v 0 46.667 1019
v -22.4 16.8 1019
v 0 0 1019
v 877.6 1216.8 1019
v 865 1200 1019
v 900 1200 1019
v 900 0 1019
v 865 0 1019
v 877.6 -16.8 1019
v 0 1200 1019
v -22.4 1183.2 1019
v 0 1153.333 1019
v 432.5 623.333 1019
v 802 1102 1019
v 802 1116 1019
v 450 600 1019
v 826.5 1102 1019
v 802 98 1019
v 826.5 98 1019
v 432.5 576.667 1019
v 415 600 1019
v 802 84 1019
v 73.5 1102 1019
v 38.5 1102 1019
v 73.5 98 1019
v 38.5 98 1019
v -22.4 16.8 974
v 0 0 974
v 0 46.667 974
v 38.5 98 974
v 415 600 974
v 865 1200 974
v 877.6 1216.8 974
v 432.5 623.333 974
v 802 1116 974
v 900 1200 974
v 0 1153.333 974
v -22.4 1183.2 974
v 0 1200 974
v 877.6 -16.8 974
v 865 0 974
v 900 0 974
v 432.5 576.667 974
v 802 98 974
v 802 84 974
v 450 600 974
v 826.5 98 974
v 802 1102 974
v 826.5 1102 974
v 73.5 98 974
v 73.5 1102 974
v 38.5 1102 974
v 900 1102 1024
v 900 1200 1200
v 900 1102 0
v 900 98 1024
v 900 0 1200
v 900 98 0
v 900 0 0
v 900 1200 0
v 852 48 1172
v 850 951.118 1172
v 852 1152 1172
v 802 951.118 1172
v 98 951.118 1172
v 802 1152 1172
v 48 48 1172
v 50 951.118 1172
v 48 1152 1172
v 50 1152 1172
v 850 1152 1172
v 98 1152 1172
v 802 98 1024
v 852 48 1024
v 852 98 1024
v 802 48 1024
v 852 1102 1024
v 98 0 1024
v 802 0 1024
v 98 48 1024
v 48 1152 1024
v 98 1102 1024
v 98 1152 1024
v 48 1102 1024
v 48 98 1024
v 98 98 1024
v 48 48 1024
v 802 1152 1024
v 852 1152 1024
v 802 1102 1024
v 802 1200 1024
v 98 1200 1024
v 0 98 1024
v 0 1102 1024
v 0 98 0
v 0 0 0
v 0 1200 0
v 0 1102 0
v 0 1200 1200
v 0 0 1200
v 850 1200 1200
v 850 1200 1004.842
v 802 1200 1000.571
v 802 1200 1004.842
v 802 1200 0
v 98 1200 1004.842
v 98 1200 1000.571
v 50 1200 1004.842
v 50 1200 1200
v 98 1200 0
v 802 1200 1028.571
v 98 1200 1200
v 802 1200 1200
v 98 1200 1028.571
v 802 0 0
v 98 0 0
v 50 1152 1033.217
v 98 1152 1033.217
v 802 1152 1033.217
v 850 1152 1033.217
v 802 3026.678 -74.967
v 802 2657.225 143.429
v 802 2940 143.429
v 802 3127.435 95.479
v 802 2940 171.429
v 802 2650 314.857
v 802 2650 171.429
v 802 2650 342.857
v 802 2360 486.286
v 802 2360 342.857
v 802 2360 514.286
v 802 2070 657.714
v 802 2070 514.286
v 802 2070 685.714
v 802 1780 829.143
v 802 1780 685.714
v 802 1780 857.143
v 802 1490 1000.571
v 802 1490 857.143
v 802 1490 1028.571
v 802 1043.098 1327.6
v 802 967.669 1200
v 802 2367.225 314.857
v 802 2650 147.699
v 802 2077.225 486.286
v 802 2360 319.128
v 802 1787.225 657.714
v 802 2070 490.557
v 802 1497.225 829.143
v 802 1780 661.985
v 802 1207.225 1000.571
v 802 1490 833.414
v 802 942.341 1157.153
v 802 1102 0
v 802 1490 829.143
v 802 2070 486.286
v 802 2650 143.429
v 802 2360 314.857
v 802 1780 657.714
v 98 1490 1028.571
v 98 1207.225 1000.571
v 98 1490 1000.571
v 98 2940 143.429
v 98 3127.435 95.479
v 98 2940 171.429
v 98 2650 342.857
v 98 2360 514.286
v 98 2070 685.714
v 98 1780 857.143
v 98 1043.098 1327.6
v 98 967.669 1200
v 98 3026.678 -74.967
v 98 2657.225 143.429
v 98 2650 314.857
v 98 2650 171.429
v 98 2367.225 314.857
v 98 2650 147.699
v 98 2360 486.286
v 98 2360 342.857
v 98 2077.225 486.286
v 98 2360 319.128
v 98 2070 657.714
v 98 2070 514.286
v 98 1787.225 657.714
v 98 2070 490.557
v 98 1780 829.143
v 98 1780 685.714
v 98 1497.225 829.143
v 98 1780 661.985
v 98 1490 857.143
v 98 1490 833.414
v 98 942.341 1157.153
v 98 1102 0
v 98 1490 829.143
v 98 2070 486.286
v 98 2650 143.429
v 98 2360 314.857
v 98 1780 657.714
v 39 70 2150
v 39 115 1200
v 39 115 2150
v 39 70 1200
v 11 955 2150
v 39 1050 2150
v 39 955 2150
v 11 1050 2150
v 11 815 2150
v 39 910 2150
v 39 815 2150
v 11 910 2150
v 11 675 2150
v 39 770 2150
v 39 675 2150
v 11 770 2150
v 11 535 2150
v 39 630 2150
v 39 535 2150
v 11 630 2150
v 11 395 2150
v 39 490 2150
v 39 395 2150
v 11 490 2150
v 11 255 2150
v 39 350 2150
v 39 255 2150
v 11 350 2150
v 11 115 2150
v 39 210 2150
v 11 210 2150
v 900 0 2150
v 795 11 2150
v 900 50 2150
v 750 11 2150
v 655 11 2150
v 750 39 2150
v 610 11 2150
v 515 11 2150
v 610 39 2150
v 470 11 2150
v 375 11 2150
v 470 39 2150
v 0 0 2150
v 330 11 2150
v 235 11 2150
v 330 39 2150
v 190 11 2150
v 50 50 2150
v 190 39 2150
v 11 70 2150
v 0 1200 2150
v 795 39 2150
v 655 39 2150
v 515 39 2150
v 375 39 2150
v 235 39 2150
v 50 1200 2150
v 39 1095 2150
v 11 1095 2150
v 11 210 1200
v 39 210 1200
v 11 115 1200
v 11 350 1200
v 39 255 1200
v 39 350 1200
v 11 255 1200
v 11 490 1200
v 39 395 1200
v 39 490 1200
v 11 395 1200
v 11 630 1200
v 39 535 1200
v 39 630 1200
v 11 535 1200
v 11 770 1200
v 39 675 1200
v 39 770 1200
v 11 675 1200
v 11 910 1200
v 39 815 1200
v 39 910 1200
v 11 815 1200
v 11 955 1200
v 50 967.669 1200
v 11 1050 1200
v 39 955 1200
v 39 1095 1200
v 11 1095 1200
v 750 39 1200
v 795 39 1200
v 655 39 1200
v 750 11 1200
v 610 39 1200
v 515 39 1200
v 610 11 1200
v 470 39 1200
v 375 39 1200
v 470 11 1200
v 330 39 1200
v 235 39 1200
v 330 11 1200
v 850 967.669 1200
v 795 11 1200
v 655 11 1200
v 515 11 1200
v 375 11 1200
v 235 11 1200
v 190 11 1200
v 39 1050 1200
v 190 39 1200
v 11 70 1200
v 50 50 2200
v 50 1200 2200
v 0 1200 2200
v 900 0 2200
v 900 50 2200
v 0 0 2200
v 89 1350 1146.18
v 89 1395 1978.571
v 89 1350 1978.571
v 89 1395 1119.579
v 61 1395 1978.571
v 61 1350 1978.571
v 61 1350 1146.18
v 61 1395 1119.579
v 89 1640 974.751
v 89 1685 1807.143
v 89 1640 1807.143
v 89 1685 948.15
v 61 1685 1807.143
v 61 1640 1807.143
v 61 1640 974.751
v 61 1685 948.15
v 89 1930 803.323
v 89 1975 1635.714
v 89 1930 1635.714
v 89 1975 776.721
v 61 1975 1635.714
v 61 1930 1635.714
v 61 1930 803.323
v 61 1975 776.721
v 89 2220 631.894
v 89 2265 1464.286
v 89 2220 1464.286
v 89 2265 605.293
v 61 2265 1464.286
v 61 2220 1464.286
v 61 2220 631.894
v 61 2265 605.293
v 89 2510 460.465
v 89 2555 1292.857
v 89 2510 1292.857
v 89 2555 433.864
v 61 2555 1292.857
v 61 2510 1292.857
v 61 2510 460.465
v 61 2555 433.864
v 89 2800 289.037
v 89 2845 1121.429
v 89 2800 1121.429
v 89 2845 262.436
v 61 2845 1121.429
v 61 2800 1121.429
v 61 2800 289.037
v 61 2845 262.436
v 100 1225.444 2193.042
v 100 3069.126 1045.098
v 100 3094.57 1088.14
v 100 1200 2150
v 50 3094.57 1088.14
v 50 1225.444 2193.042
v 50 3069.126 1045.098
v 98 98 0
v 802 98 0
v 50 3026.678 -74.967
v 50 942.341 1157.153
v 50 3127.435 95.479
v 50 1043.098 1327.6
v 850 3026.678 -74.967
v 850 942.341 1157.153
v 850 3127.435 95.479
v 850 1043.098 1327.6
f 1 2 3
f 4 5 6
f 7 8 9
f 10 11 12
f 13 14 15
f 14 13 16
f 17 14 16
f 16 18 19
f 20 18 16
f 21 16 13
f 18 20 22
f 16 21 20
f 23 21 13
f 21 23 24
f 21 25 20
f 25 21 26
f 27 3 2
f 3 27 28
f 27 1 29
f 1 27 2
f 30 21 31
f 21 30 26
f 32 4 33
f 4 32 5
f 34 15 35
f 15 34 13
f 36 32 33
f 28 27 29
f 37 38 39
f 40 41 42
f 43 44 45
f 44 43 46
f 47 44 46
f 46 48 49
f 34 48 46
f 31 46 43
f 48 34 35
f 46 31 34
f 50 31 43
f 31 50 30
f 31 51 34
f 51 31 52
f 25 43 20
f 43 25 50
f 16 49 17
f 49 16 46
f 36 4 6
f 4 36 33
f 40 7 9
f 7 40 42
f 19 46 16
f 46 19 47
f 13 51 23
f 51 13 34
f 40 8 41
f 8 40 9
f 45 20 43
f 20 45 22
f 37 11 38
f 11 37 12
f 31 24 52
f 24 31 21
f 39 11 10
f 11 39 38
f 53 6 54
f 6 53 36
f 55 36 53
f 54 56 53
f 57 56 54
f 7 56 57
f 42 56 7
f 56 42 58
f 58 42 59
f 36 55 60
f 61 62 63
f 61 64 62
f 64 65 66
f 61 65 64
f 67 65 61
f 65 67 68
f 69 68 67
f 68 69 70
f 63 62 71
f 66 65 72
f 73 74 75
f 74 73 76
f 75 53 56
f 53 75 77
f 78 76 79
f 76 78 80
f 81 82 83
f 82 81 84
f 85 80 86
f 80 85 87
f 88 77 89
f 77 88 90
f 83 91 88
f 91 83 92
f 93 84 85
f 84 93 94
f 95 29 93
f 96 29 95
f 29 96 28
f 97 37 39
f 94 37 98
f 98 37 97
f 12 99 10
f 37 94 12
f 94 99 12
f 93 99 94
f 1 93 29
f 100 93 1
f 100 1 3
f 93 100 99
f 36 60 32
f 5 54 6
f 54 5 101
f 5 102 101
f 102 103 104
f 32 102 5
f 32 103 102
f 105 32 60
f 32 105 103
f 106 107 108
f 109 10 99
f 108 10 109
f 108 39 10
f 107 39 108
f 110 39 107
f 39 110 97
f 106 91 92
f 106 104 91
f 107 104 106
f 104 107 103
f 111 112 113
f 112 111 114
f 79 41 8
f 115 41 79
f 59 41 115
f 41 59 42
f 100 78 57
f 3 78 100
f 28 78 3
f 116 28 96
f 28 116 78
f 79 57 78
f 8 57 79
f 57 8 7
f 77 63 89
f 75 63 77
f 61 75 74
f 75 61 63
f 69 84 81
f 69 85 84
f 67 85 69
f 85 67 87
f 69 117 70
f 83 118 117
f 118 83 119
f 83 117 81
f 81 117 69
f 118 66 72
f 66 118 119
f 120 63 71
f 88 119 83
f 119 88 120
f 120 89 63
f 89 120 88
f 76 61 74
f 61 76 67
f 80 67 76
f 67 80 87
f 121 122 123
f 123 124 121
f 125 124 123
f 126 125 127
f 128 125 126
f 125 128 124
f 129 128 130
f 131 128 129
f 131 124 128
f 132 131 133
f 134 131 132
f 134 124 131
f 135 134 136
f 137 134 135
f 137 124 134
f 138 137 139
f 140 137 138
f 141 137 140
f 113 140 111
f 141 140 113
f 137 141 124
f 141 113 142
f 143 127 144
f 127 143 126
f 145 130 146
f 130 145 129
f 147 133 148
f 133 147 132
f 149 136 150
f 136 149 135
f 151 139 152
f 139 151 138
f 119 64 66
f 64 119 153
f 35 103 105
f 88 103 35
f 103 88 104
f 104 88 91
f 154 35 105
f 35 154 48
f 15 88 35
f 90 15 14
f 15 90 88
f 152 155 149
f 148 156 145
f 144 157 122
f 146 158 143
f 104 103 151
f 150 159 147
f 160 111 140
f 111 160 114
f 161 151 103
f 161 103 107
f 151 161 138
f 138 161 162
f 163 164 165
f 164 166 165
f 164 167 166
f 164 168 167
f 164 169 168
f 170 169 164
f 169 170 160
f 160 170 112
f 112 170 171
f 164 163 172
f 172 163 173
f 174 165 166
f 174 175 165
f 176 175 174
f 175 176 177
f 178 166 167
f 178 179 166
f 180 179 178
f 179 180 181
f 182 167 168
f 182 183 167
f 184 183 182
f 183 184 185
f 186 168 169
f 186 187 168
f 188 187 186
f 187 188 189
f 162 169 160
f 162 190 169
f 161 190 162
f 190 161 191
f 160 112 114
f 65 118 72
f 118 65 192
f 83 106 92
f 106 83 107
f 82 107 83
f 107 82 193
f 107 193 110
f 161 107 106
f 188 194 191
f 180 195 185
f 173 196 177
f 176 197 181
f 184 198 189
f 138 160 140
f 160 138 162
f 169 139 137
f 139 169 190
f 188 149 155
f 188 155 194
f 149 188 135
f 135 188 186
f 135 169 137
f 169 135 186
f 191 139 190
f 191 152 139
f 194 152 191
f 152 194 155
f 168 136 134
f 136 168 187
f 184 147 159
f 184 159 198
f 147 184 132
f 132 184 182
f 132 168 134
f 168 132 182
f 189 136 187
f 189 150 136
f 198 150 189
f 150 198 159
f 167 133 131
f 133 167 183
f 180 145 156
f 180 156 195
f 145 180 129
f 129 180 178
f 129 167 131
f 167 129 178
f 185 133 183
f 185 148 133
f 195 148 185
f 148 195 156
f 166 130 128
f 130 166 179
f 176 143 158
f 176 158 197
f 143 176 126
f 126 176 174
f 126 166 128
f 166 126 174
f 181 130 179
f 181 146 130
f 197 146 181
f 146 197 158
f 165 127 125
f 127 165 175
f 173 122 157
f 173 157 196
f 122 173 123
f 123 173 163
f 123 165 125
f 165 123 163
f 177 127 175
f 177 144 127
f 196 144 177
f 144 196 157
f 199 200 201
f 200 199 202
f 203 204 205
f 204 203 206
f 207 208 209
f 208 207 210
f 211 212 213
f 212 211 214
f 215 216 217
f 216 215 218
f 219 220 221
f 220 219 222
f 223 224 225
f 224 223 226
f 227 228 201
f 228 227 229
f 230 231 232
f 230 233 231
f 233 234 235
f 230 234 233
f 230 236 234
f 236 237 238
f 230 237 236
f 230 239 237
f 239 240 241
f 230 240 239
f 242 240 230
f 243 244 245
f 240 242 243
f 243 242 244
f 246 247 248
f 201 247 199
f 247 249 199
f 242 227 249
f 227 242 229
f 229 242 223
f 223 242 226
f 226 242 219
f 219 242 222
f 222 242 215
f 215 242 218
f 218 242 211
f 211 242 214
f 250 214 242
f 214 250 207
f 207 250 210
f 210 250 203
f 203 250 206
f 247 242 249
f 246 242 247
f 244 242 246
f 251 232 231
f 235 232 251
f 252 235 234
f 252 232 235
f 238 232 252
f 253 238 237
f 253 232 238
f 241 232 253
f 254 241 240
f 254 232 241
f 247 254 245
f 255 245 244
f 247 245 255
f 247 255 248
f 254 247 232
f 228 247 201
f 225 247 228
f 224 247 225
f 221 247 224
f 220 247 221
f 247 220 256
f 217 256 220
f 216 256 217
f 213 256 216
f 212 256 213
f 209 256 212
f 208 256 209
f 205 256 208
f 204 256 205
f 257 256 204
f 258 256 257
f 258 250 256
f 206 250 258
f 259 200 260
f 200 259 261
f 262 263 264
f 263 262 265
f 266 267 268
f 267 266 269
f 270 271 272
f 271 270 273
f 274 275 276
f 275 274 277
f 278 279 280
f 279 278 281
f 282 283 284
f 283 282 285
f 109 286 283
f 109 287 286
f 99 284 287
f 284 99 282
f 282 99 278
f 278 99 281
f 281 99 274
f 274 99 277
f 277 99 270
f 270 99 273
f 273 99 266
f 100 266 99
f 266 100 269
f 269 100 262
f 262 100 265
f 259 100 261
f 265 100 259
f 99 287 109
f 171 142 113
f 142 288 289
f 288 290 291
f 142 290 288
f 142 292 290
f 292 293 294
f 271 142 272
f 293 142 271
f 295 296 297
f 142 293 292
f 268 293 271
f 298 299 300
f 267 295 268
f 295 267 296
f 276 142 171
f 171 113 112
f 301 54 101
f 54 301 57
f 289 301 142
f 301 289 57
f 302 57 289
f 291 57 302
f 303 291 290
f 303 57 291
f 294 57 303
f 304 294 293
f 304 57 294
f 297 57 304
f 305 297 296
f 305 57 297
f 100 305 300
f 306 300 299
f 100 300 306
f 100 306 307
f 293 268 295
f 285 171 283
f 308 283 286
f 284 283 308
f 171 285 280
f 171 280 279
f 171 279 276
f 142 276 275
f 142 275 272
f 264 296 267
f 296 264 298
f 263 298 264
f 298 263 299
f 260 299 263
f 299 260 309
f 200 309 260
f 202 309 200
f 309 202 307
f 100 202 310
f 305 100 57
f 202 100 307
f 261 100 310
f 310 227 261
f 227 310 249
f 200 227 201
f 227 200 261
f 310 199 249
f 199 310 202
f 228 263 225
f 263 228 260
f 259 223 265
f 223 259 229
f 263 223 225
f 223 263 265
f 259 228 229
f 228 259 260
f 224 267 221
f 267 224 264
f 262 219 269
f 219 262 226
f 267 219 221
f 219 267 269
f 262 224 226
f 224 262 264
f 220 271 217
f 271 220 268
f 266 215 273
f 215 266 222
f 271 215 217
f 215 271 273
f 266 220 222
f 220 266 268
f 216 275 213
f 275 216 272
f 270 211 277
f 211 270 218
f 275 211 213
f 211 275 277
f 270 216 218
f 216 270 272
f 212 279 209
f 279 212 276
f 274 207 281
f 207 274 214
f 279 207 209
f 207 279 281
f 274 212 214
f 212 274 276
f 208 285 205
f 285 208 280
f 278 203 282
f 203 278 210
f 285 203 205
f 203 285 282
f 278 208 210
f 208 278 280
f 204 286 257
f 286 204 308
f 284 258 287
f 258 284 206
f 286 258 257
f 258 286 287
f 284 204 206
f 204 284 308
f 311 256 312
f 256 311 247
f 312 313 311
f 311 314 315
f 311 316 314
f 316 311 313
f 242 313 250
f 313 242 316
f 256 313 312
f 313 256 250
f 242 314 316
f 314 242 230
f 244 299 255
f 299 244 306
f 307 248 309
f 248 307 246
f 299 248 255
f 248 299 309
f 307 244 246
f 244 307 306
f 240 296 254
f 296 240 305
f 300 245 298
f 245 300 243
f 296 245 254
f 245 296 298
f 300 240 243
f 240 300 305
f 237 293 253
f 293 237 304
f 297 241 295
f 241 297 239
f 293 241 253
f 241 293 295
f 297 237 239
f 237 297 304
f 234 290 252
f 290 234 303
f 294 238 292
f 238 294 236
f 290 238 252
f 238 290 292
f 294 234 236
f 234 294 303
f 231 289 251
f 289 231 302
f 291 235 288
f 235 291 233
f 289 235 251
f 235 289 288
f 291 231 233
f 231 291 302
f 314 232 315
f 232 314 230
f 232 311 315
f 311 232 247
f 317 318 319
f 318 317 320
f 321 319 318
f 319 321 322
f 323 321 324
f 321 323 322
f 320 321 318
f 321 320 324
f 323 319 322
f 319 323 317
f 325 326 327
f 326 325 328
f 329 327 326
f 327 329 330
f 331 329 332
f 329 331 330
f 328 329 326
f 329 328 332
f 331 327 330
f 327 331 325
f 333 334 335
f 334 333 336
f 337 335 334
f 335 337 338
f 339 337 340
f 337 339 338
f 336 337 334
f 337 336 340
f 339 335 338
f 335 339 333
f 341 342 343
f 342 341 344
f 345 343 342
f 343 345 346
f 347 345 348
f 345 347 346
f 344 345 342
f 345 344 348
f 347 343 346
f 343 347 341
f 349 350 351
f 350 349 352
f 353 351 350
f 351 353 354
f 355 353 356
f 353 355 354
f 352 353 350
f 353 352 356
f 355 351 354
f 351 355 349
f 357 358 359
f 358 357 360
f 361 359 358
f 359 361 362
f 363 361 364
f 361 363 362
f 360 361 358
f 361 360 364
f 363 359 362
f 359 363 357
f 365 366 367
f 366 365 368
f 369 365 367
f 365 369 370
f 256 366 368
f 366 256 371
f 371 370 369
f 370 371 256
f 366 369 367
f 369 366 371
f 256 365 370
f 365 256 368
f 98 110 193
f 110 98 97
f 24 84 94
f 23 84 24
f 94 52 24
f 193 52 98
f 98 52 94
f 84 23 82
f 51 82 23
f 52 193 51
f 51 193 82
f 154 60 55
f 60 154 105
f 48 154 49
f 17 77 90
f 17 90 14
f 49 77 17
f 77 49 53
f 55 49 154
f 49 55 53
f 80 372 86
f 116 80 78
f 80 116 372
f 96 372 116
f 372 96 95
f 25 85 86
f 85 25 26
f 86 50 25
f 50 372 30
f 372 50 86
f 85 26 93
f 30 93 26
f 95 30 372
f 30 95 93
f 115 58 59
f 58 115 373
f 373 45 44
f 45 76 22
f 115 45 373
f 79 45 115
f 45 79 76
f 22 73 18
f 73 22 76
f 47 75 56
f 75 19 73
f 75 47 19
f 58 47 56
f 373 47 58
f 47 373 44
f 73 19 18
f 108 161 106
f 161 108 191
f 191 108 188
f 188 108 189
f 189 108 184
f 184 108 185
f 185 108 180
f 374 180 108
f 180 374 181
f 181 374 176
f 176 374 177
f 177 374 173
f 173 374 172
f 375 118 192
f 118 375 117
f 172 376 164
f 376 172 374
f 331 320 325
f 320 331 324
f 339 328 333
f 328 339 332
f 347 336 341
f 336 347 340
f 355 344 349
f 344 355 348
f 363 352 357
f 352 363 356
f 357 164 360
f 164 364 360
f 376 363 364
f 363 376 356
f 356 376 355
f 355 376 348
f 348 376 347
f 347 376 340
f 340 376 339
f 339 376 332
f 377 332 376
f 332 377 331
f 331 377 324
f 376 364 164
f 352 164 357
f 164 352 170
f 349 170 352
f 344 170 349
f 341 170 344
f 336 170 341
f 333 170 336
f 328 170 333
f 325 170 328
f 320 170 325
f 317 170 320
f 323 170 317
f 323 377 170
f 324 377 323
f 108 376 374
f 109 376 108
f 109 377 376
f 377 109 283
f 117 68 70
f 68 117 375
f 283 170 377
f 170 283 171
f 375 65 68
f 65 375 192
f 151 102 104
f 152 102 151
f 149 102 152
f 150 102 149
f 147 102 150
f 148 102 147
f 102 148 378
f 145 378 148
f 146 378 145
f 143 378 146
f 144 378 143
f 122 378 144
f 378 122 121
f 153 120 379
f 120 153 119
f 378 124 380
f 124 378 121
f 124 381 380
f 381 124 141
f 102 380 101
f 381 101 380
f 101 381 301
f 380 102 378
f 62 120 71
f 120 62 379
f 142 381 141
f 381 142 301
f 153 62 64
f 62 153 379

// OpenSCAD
// --- PARAMETRIT ---
eps = 0.05; 

tasanne_leveys = 900; 
tasanne_syvyys = 1200; 
kokonaiskorkeus = 1200; 

askelmien_maara = 6; 
nousuja_yhteensa = 7; 
askelma_nousu = kokonaiskorkeus / nousuja_yhteensa; // ~171.4 mm
askelma_etenema = 290; 

portaan_leveys = 800; 
lauta_paksuus = 28; 
runko_korkeus = 148; 
reisilankku_paksuus = 48; 
reisilankku_leveys = 198; 

kaide_korkeus = 950; 
kaide_paksuus = 50; // Käsijohteen paksuus/leveys
rima_leveys = 45;
rima_paksuus = 28;
rima_jako = 140; // Rimojen väli keskeltä keskelle (jättää n. 95mm raon)

tolppa_koko = 98; 

// --- MALLINNUS ---

// 1. TUKITOLPAT
module tolppa() {
    cube([tolppa_koko, tolppa_koko, kokonaiskorkeus - lauta_paksuus - runko_korkeus]);
}
translate([0, tasanne_syvyys - tolppa_koko, 0]) tolppa();
translate([tasanne_leveys - tolppa_koko, tasanne_syvyys - tolppa_koko, 0]) tolppa();
translate([0, 0, 0]) tolppa();
translate([tasanne_leveys - tolppa_koko, 0, 0]) tolppa();

// 2. RISTITUKI
translate([0, 0, kokonaiskorkeus - runko_korkeus - lauta_paksuus - 50]) {
    diag_pituus = sqrt(pow(tasanne_leveys, 2) + pow(tasanne_syvyys, 2));
    angle = atan(tasanne_syvyys / tasanne_leveys);
    rotate([0, 0, angle]) cube([diag_pituus, 28, 45]);
    translate([tasanne_leveys, 0, 0]) rotate([0, 0, 180 - angle]) cube([diag_pituus, 28, 45]);
}

// 3. TERASSIN KANSI JA RUNKO
translate([0, 0, kokonaiskorkeus - lauta_paksuus])
    cube([tasanne_leveys, tasanne_syvyys, lauta_paksuus]);

translate([0, 0, kokonaiskorkeus - runko_korkeus - lauta_paksuus])
    difference() {
        cube([tasanne_leveys, tasanne_syvyys, runko_korkeus]);
        translate([reisilankku_paksuus, reisilankku_paksuus, -eps])
            cube([tasanne_leveys - (2 * reisilankku_paksuus), tasanne_syvyys - (2 * reisilankku_paksuus), runko_korkeus + 2 * eps]);
    }

// 4. SUORAT REISILANKUT
module suora_reisilankku() {
    run = askelmien_maara * askelma_etenema;
    rise = kokonaiskorkeus - askelma_nousu;
    pituus = sqrt(pow(run, 2) + pow(rise, 2)) + 400;
    angle = -atan(rise / run);
    
    rotate([angle, 0, 0])
        translate([0, -200, -reisilankku_leveys + 30])
            cube([reisilankku_paksuus, pituus, reisilankku_leveys]);
}

translate([(tasanne_leveys - portaan_leveys) / 2, tasanne_syvyys, kokonaiskorkeus])
    suora_reisilankku();

translate([(tasanne_leveys - portaan_leveys) / 2 + portaan_leveys - reisilankku_paksuus, tasanne_syvyys, kokonaiskorkeus])
    suora_reisilankku();

// 5. ASKELMAT (Vain tasot)
for(i = [0 : askelmien_maara - 1]) {
    z_pinta = kokonaiskorkeus - ((i + 1) * askelma_nousu);
    y_pos = tasanne_syvyys + (i * askelma_etenema);
    
    translate([(tasanne_leveys - portaan_leveys) / 2 + reisilankku_paksuus, y_pos, z_pinta - lauta_paksuus])
        cube([portaan_leveys - 2 * reisilankku_paksuus, askelma_etenema, lauta_paksuus]);
}

// 6. VIIMEISTELTY KAIDE

// A. Tasanteen sivukaide (Vasen sivu)
translate([0, 0, kokonaiskorkeus]) {
    // Käsijohde (Yhdistyy päätyyn)
    translate([0, 0, kaide_korkeus])
        cube([kaide_paksuus, tasanne_syvyys, kaide_paksuus]);
    
    // Pystyrimat tasaisella jaolla
    for(y = [rima_jako/2 : rima_jako : tasanne_syvyys - rima_leveys])
        translate([(kaide_paksuus-rima_paksuus)/2, y, 0]) 
            cube([rima_paksuus, rima_leveys, kaide_korkeus]);
}

// B. Tasanteen päätykaide (Takareuna)
translate([0, 0, kokonaiskorkeus]) {
    // Käsijohde
    translate([0, 0, kaide_korkeus])
        cube([tasanne_leveys, kaide_paksuus, kaide_paksuus]);
        
    // Pystyrimat
    for(x = [kaide_paksuus + rima_jako : rima_jako : tasanne_leveys - rima_leveys])
        translate([x, (kaide_paksuus-rima_paksuus)/2, 0]) 
            cube([rima_leveys, rima_paksuus, kaide_korkeus]);
}

// C. Porraskaide (Vasen reuna)
translate([(tasanne_leveys - portaan_leveys) / 2, tasanne_syvyys, 0]) {
    run_v = askelmien_maara * askelma_etenema;
    rise_v = kokonaiskorkeus - askelma_nousu;
    pituus_v = sqrt(pow(run_v, 2) + pow(rise_v, 2)) + 150;
    kulma_v = -atan(rise_v / run_v);
    
    // Käsijohde, joka alkaa tarkalleen tasanteen kulmasta
    translate([0, 0, kokonaiskorkeus + kaide_korkeus]) 
        rotate([kulma_v, 0, 0]) 
            cube([kaide_paksuus, pituus_v, kaide_paksuus]);
        
    // Pystyrimat jokaiselle askelmalle
    for(i = [0 : askelmien_maara - 1]) {
        z_base = kokonaiskorkeus - ((i + 1) * askelma_nousu);
        y_loc = i * askelma_etenema + 150;
        
        // Rima kiinnittyy askelmaan
        translate([(kaide_paksuus-rima_paksuus)/2, y_loc, z_base]) 
            cube([rima_paksuus, rima_leveys, kaide_korkeus]);
    }
}
